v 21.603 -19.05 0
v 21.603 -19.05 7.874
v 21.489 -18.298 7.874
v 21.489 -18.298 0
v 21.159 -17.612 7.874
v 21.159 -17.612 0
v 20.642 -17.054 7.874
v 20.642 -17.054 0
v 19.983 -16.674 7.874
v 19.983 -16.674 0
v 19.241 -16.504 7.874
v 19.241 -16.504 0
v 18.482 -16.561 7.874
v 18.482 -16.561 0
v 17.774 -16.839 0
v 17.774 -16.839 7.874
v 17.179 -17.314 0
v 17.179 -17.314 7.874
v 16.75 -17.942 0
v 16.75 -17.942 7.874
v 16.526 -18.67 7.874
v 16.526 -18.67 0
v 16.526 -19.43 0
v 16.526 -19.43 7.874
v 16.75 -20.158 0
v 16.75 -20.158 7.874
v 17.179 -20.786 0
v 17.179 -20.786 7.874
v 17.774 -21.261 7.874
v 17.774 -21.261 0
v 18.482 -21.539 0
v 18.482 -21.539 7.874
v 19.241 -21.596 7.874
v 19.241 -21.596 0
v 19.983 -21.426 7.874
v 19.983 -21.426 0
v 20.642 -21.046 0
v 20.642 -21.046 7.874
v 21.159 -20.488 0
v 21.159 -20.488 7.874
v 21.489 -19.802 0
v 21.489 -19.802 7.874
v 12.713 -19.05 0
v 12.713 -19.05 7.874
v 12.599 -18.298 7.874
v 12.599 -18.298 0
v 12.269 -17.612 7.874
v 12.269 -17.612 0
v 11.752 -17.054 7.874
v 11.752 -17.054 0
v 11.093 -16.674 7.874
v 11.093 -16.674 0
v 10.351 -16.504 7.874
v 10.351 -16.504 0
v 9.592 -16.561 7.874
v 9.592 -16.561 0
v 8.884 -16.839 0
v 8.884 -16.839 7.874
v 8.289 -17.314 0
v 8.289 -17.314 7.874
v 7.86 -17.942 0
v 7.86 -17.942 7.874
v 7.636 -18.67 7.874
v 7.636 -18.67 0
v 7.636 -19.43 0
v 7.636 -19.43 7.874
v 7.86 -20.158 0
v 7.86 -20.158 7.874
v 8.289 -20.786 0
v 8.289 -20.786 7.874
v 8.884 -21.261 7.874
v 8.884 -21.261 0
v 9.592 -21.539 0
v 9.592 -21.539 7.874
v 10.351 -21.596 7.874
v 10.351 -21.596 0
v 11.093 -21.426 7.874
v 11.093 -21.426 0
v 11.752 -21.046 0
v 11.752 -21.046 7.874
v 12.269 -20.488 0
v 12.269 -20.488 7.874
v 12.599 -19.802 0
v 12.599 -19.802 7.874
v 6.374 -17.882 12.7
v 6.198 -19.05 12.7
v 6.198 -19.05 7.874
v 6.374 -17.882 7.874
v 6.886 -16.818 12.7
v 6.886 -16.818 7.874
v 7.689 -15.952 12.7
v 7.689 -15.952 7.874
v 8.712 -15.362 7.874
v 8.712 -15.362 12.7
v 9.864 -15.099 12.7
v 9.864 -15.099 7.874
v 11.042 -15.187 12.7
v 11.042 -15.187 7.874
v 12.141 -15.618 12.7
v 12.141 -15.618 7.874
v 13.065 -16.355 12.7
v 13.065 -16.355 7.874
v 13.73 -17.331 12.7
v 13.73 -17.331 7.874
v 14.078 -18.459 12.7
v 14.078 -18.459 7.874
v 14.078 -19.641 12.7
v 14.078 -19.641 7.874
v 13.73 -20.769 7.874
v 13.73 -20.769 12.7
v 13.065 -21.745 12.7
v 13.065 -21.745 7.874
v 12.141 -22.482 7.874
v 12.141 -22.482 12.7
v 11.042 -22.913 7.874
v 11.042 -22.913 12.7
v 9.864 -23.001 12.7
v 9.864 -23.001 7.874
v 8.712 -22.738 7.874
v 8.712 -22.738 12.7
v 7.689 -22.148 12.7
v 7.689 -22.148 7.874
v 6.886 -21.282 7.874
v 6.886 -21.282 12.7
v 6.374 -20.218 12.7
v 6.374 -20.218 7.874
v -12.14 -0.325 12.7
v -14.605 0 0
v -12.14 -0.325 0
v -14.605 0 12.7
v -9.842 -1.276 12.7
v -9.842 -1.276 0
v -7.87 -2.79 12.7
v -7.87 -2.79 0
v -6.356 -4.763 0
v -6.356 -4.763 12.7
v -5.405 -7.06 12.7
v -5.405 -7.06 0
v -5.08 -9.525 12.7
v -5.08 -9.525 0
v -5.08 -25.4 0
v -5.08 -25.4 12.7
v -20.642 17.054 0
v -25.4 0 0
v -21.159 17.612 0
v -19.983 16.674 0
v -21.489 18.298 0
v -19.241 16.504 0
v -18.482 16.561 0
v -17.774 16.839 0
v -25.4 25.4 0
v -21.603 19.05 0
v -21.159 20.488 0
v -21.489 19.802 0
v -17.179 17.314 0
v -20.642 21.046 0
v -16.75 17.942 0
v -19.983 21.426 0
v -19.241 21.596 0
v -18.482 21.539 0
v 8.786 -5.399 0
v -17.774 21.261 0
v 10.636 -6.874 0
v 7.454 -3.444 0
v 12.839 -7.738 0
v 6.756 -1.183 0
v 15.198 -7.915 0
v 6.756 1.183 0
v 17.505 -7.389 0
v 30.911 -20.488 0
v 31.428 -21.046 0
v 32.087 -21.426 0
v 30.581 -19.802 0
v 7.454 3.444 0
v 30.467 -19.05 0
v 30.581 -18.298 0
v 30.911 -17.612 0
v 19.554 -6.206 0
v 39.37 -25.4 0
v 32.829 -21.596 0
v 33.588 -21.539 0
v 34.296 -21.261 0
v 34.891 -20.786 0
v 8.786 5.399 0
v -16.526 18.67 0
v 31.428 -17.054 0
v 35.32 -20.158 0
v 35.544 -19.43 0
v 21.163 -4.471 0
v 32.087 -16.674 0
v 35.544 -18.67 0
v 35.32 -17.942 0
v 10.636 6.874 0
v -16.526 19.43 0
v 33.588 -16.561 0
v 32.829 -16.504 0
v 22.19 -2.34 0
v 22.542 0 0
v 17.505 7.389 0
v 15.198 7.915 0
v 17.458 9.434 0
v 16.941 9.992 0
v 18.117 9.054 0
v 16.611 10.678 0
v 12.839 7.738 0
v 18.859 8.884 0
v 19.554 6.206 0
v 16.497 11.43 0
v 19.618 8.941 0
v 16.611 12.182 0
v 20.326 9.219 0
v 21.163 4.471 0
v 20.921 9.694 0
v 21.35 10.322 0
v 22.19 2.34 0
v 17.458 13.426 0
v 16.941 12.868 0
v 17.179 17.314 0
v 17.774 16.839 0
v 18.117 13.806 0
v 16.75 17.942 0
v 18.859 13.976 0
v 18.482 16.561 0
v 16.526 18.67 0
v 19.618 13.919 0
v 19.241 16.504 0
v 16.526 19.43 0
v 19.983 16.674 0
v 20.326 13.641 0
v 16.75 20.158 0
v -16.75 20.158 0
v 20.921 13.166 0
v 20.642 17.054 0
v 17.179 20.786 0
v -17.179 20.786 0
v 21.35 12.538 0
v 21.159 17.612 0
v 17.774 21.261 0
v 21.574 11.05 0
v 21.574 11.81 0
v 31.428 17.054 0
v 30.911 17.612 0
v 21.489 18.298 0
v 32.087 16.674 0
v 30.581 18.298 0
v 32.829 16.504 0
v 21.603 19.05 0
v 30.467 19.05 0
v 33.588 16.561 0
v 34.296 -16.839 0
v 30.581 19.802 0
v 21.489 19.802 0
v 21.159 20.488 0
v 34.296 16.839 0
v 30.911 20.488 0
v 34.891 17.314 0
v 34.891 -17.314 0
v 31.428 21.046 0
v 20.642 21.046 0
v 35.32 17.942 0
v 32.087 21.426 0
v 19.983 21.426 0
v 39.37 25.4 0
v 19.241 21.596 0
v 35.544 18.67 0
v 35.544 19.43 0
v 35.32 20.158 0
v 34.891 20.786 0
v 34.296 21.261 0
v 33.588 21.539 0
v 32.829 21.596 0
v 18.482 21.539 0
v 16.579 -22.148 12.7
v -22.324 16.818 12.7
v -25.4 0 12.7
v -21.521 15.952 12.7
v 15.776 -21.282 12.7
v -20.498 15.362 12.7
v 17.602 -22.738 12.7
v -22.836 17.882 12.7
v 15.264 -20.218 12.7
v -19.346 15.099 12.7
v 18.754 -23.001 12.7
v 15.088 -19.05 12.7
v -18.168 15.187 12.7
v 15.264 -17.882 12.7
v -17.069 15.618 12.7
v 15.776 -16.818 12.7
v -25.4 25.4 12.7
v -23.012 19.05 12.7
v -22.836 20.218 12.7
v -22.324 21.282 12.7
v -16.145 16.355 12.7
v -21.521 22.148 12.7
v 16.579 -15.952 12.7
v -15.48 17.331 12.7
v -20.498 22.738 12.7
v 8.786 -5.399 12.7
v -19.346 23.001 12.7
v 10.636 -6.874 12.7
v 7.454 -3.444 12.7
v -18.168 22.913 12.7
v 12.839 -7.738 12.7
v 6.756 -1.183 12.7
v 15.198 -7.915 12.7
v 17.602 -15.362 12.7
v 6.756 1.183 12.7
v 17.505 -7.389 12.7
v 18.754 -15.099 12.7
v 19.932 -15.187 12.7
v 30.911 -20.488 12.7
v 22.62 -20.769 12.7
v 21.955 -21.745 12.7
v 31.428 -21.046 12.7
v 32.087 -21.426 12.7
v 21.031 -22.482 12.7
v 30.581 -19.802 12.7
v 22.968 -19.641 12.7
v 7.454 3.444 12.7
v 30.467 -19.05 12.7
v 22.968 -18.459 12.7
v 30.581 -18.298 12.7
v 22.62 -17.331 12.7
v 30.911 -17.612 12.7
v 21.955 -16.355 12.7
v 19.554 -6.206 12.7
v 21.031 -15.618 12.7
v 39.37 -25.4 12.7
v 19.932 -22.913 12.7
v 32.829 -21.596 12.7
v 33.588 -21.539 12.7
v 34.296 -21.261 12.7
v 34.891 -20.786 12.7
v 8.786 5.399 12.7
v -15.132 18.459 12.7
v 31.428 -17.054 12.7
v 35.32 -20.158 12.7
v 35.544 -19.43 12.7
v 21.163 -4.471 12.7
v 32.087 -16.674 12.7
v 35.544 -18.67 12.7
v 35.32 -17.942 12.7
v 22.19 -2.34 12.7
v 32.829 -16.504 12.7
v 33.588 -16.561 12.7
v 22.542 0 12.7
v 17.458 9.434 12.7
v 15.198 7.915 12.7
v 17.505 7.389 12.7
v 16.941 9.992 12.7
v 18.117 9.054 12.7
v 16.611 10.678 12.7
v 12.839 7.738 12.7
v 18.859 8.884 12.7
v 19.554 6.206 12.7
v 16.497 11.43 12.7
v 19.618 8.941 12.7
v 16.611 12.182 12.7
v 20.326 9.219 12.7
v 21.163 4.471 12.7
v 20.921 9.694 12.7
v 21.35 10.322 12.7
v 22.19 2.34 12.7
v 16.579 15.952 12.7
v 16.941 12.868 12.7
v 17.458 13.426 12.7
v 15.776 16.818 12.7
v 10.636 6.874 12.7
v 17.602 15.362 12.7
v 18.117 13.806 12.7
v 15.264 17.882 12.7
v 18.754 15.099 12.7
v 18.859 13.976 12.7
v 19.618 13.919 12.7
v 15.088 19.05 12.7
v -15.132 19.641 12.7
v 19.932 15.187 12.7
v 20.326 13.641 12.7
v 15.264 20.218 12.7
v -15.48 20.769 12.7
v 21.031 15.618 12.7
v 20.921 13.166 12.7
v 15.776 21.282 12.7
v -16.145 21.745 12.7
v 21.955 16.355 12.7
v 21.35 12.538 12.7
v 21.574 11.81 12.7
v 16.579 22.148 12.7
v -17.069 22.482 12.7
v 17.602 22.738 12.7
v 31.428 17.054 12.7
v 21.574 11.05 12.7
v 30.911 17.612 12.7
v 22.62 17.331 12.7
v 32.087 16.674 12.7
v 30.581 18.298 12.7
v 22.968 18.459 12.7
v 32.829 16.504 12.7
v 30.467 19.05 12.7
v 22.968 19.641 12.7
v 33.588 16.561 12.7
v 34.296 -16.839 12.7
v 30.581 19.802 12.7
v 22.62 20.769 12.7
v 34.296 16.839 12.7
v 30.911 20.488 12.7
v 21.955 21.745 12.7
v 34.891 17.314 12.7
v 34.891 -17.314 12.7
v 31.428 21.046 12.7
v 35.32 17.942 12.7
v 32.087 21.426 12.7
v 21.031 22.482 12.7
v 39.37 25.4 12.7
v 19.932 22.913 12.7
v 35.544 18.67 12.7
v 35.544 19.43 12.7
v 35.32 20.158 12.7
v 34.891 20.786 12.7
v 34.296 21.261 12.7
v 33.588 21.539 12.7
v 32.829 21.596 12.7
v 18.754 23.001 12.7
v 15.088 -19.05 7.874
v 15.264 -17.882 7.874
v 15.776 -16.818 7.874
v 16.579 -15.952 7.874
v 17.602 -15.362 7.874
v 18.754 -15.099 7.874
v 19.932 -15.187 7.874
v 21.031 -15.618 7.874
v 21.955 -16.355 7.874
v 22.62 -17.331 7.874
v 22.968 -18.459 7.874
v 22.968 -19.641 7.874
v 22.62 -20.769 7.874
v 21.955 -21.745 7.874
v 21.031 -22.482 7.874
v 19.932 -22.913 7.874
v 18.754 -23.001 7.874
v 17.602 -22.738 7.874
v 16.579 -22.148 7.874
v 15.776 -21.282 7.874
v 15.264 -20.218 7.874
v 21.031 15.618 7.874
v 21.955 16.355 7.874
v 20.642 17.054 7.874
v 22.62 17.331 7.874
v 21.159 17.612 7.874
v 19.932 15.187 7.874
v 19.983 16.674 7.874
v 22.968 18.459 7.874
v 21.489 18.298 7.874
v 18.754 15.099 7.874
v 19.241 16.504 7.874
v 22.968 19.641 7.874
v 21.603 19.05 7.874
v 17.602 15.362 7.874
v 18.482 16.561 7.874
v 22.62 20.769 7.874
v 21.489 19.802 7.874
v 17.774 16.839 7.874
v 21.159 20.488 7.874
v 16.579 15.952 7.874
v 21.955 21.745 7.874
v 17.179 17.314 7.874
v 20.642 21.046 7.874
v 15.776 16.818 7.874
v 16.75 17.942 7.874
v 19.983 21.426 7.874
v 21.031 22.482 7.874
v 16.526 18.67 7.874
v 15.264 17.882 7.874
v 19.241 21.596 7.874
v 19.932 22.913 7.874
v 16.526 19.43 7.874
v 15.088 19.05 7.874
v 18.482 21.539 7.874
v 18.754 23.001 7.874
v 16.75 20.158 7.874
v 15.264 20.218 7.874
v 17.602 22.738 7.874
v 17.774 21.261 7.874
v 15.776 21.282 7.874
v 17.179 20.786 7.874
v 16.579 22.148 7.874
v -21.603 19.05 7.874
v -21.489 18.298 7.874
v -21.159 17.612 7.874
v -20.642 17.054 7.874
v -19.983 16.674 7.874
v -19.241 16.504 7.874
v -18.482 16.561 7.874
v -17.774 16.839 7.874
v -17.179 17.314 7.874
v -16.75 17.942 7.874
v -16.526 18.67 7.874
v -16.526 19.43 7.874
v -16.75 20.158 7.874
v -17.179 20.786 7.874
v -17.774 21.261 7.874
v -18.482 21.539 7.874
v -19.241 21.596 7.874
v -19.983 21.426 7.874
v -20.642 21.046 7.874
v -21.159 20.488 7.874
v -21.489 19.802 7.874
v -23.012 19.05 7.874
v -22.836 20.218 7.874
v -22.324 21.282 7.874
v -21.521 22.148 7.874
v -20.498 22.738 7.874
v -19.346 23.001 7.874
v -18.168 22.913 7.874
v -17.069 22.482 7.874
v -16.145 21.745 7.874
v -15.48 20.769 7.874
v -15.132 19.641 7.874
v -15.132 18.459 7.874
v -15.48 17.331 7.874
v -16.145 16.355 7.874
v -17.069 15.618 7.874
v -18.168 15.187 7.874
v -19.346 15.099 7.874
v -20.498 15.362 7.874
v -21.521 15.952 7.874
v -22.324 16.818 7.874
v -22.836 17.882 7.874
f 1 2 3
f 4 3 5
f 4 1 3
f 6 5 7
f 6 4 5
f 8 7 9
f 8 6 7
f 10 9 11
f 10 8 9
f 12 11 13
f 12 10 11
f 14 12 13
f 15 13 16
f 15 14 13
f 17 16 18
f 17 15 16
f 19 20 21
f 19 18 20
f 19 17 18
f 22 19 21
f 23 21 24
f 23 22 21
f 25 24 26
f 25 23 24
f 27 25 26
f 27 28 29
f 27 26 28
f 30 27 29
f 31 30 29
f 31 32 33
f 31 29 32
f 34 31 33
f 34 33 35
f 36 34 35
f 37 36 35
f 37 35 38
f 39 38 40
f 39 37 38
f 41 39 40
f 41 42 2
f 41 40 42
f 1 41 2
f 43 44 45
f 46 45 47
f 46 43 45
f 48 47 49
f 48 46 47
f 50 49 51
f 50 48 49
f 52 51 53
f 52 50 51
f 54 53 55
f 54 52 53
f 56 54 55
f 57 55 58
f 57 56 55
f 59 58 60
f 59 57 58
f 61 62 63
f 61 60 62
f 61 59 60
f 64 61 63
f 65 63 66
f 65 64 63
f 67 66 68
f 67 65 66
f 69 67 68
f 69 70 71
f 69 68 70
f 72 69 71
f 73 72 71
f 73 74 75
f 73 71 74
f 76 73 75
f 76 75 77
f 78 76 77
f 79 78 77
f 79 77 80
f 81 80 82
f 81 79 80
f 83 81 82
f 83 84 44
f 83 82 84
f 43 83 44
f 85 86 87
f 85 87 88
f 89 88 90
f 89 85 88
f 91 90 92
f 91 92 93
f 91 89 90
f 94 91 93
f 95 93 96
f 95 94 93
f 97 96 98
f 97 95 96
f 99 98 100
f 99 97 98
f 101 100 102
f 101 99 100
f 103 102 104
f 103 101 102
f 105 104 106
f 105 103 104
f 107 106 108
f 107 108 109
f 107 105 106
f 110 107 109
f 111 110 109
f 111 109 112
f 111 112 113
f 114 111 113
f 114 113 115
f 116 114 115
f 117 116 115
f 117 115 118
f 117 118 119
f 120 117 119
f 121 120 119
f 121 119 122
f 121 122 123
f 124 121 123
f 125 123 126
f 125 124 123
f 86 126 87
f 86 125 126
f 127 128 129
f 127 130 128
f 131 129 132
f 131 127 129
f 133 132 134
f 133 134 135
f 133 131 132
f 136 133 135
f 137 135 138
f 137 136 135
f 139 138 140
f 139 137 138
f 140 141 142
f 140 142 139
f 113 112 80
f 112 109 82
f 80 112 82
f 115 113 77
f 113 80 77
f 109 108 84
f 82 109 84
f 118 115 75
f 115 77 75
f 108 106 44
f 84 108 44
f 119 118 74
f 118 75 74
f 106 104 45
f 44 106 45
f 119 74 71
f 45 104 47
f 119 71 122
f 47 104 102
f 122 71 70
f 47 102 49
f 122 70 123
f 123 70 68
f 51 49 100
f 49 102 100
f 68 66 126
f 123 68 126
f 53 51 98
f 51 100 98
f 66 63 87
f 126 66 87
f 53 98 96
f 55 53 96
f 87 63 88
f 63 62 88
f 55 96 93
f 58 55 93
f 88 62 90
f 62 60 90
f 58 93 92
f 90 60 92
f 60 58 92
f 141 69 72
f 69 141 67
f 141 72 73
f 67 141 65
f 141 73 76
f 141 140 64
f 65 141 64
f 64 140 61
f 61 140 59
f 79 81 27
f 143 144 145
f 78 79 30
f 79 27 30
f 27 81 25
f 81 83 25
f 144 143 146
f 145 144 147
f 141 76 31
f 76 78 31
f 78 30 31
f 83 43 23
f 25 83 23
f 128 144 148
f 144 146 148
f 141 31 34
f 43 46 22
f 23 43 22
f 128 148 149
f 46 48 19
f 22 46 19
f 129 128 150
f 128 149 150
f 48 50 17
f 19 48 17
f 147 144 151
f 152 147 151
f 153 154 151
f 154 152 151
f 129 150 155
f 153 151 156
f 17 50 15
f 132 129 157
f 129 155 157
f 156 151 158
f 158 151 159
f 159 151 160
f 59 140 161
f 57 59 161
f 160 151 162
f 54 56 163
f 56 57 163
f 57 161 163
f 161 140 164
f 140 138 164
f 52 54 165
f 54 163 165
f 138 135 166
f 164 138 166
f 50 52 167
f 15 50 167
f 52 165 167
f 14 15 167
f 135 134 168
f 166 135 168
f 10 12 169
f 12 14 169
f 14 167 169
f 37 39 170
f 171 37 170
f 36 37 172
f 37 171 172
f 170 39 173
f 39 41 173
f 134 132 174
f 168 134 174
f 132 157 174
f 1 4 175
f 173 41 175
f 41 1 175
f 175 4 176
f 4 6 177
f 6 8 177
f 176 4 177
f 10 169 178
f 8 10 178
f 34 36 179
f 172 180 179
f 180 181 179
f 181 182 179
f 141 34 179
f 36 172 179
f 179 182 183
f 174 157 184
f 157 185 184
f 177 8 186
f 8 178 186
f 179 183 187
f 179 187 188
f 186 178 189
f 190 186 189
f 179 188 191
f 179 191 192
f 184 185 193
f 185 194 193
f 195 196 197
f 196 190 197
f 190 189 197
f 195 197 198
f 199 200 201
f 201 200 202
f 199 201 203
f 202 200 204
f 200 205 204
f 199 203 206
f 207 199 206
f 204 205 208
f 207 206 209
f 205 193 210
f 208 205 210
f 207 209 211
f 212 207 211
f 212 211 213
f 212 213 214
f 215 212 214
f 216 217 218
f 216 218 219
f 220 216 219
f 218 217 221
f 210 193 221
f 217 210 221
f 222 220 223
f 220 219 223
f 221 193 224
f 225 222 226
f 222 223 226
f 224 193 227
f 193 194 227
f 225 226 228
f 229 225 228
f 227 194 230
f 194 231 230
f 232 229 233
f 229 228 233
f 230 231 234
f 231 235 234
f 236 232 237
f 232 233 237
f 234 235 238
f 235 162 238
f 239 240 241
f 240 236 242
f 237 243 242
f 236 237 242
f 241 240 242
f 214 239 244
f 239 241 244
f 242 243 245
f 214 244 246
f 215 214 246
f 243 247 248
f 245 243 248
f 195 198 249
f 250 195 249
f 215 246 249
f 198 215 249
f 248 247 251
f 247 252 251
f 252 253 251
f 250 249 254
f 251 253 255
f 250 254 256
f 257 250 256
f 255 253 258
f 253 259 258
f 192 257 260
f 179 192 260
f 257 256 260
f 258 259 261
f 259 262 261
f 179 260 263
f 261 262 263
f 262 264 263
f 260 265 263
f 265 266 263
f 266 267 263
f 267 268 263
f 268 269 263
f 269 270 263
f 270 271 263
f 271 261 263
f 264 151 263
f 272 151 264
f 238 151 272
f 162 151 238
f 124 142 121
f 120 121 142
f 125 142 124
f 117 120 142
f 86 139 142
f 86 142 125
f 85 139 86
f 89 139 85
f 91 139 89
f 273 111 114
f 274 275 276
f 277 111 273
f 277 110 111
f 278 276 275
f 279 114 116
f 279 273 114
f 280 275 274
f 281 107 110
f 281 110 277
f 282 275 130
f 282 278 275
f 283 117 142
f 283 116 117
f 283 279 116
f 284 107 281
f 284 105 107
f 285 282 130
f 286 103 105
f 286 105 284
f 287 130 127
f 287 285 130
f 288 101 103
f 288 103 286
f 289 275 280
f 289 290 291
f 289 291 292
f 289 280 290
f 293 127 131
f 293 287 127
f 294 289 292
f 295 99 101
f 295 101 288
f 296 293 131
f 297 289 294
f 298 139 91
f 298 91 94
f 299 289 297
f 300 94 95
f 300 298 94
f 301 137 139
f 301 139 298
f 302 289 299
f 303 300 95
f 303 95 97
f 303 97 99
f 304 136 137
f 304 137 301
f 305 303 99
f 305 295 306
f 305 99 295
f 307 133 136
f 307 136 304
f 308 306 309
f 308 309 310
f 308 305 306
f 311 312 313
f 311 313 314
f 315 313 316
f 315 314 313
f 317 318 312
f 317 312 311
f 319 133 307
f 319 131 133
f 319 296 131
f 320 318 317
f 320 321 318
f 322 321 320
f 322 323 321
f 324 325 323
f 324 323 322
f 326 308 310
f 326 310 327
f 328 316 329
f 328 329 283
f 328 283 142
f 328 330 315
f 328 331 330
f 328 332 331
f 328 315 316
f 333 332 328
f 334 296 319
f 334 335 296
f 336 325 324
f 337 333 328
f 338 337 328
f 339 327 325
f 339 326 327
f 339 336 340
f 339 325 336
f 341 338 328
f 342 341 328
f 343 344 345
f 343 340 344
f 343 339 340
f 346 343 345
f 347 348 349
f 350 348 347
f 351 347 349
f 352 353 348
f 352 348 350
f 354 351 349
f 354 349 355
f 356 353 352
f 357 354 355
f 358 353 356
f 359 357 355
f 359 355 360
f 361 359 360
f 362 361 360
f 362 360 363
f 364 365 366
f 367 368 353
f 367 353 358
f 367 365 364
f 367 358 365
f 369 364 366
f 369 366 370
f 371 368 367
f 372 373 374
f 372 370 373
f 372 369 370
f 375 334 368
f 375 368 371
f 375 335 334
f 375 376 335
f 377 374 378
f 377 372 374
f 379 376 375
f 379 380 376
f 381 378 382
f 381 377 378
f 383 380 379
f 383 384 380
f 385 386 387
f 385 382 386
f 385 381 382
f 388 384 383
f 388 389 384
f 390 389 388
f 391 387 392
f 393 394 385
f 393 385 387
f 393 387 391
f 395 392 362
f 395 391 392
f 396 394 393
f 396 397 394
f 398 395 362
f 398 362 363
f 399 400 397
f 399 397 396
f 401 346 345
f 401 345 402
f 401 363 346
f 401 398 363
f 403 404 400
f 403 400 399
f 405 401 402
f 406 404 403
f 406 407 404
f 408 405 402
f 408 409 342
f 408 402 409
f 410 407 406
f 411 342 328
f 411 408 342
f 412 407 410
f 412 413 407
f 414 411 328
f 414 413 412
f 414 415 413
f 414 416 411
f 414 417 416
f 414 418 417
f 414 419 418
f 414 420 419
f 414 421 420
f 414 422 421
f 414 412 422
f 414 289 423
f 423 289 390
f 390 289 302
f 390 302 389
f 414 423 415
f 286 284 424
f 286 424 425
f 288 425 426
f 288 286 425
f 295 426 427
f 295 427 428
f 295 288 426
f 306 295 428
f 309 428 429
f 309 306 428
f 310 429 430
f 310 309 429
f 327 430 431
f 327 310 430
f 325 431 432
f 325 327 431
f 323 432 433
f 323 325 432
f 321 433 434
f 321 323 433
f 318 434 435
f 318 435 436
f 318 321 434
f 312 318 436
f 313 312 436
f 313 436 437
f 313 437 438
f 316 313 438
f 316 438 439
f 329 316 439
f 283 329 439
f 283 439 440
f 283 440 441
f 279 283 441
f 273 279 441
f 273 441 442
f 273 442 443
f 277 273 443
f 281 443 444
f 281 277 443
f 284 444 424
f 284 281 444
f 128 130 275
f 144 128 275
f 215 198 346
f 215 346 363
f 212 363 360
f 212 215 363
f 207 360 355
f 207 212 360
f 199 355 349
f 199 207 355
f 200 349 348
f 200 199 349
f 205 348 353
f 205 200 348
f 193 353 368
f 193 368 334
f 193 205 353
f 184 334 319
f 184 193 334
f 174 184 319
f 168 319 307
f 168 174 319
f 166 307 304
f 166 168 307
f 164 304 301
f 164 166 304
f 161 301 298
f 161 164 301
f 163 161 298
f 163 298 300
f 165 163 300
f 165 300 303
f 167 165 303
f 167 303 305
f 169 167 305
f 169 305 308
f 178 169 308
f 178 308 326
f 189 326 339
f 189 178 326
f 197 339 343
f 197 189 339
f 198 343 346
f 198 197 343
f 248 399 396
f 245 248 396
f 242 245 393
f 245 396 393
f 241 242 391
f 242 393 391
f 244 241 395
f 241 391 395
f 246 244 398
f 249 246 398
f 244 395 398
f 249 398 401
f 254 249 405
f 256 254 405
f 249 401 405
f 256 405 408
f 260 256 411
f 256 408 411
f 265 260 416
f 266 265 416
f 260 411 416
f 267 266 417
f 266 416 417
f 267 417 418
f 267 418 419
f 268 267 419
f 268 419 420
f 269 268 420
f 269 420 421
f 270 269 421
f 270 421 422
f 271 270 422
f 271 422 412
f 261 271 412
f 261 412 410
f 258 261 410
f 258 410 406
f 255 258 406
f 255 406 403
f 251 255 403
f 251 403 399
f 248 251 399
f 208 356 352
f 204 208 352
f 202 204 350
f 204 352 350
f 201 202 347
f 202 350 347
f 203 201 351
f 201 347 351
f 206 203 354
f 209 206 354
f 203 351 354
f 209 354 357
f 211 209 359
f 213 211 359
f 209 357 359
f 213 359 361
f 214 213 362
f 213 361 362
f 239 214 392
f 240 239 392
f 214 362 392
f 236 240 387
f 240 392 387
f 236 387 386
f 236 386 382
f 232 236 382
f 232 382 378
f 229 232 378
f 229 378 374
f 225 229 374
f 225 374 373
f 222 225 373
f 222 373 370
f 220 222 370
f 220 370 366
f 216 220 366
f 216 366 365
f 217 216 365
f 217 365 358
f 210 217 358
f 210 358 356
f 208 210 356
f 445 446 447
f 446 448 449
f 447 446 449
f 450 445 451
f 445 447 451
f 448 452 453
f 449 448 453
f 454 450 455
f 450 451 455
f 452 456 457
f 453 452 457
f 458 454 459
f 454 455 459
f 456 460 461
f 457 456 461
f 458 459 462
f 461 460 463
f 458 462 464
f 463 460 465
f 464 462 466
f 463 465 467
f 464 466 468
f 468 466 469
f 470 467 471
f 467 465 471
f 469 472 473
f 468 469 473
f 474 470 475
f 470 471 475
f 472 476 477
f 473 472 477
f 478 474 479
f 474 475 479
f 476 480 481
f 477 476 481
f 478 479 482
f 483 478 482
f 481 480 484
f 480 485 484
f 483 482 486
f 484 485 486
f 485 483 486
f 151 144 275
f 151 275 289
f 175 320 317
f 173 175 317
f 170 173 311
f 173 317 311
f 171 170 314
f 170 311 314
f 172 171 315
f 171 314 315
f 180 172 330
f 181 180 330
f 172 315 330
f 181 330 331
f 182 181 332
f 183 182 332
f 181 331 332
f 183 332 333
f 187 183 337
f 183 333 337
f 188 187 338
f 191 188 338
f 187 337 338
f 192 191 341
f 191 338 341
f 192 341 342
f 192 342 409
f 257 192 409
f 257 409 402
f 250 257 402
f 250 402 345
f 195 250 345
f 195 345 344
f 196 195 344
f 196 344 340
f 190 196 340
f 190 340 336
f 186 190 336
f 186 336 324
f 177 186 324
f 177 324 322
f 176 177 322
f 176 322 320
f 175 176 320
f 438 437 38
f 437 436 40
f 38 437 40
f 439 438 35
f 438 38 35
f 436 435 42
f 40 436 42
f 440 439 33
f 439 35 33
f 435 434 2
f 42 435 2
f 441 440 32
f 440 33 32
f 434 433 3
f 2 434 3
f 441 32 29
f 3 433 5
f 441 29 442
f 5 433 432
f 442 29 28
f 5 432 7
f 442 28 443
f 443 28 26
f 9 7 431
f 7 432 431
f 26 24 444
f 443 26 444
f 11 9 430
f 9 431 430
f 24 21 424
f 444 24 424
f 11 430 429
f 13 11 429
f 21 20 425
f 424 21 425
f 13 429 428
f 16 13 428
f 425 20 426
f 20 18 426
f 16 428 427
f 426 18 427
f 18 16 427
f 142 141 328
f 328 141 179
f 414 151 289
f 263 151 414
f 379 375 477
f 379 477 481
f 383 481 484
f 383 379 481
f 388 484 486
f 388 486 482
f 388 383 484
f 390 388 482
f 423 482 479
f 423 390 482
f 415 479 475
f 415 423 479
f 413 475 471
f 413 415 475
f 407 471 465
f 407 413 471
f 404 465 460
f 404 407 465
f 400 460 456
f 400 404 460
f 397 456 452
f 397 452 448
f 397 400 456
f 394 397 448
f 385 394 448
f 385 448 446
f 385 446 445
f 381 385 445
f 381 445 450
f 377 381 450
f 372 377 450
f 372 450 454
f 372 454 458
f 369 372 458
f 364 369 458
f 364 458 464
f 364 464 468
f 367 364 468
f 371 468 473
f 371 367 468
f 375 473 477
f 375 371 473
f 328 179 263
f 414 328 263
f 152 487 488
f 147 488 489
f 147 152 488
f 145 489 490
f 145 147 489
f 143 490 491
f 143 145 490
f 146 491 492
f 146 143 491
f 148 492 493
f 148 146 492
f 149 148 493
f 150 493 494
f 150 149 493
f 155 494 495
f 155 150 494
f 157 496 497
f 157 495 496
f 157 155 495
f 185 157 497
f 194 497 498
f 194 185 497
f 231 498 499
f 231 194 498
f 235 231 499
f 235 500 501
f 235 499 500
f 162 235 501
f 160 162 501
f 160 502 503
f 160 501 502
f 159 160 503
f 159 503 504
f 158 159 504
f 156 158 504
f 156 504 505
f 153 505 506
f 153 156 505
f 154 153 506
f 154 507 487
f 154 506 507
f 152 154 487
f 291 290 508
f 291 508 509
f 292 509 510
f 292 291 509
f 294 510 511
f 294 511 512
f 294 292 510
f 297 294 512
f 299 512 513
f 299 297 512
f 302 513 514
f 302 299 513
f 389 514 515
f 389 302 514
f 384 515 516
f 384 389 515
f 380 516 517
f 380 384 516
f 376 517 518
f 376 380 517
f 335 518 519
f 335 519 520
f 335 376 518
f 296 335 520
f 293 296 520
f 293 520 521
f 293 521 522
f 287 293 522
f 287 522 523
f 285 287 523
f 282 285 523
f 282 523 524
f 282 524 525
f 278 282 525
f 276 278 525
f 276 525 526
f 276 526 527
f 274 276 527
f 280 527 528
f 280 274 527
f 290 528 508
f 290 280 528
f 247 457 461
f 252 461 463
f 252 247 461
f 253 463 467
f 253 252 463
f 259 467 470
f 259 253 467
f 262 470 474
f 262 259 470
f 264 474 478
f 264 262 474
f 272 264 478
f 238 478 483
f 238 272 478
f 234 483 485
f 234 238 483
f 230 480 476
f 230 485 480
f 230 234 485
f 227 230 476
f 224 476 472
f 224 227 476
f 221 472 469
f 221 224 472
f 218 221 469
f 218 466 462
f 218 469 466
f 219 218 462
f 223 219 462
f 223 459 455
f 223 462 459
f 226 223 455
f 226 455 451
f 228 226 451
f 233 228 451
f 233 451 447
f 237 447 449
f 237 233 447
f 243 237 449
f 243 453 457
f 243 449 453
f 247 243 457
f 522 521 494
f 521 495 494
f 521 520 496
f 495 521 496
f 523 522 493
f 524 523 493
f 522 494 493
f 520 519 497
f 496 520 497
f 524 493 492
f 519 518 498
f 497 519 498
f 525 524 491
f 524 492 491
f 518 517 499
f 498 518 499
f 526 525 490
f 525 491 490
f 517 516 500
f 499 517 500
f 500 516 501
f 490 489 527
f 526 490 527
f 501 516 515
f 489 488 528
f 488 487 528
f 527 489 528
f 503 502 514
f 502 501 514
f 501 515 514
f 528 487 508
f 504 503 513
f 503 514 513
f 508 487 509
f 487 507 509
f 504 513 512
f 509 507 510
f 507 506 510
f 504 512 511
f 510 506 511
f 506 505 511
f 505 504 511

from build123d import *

# Parameters (mm, degrees)
SKETCH1_W                      = 64.77
SKETCH1_H                      = 50.8
SKETCH1_R                      = 2.5527
SKETCH1_R_2                    = 7.9375
BOSS_EXTRUDE1_DEPTH            = 12.7
F_7_0_201_DIAMETER_HOLE1_D     = 5.1054
F_7_0_201_DIAMETER_HOLE1_DEPTH = 70.104
F_7_0_201_DIAMETER_HOLE1_TIP   = 1.533816902
SKETCH6_R                      = 3.9624
CUT_EXTRUDE1_DEPTH             = 4.826
SKETCH7_W                      = 20.32
SKETCH7_H                      = 25.4
CUT_EXTRUDE2_DEPTH             = 49.543247728
FILLET2_R                      = 9.525


with BuildPart() as part:
    # Sketch1 → Boss-Extrude1 (new body)
    with BuildSketch(Plane.XY):
        with Locations((6.985, 0)):
            Rectangle(SKETCH1_W, SKETCH1_H)
        with Locations(Location((-19.05, 19.05, 0), (0, 0, 180))):
            Circle(SKETCH1_R, mode=Mode.SUBTRACT)
        with Locations((19.05, 19.05)):
            Circle(SKETCH1_R, mode=Mode.SUBTRACT)
        with Locations((19.05, -19.05)):
            Circle(SKETCH1_R, mode=Mode.SUBTRACT)
        with Locations((10.16, -19.05)):
            Circle(SKETCH1_R, mode=Mode.SUBTRACT)
        with Locations((14.605, 0)):
            Circle(SKETCH1_R_2, mode=Mode.SUBTRACT)
    extrude(amount=BOSS_EXTRUDE1_DEPTH)

    # #7 (0.201) Diameter Hole1
    with Locations(Plane(origin=(-24.721209515, -12.864288698, 0), x_dir=(1, 0, 0), z_dir=(0, 0, -1))):
        with Locations((57.741209515, 6.185711302), (57.741209515, -31.914288698), (43.771209515, -24.294288698)):
            Hole(F_7_0_201_DIAMETER_HOLE1_D / 2, depth=F_7_0_201_DIAMETER_HOLE1_DEPTH)
            with Locations((0, 0, -(F_7_0_201_DIAMETER_HOLE1_DEPTH + F_7_0_201_DIAMETER_HOLE1_TIP / 2))):  # 118° drill point
                Cone(0, F_7_0_201_DIAMETER_HOLE1_D / 2, F_7_0_201_DIAMETER_HOLE1_TIP, mode=Mode.SUBTRACT)

    # Sketch6 → Cut-Extrude1 (cut)
    with BuildSketch(Plane(origin=(0, 0, 12.7), x_dir=(-1, 0, 0), z_dir=(0, 0, -1))):
        with Locations((-19.05, 19.05)):
            Circle(SKETCH6_R)
        with Locations((-19.05, -19.05)):
            Circle(SKETCH6_R)
        with Locations((-10.16, -19.05)):
            Circle(SKETCH6_R)
        with Locations((19.05, 19.05)):
            Circle(SKETCH6_R)
    extrude(amount=CUT_EXTRUDE1_DEPTH, mode=Mode.SUBTRACT)

    # Sketch7 → Cut-Extrude2 (cut, through all)
    with BuildSketch(Plane(origin=(0, 0, 0), x_dir=(-1, 0, 0), z_dir=(0, 0, -1))):
        with Locations((15.24, -12.7)):
            Rectangle(SKETCH7_W, SKETCH7_H)
    extrude(amount=-CUT_EXTRUDE2_DEPTH, mode=Mode.SUBTRACT)

    # Fillet2
    fillet2_edges = [part.edges().sort_by_distance(p)[0] for p in [
        (-5.08, 0, 6.35),
    ]]
    fillet(fillet2_edges, radius=FILLET2_R)


solid = part.part
